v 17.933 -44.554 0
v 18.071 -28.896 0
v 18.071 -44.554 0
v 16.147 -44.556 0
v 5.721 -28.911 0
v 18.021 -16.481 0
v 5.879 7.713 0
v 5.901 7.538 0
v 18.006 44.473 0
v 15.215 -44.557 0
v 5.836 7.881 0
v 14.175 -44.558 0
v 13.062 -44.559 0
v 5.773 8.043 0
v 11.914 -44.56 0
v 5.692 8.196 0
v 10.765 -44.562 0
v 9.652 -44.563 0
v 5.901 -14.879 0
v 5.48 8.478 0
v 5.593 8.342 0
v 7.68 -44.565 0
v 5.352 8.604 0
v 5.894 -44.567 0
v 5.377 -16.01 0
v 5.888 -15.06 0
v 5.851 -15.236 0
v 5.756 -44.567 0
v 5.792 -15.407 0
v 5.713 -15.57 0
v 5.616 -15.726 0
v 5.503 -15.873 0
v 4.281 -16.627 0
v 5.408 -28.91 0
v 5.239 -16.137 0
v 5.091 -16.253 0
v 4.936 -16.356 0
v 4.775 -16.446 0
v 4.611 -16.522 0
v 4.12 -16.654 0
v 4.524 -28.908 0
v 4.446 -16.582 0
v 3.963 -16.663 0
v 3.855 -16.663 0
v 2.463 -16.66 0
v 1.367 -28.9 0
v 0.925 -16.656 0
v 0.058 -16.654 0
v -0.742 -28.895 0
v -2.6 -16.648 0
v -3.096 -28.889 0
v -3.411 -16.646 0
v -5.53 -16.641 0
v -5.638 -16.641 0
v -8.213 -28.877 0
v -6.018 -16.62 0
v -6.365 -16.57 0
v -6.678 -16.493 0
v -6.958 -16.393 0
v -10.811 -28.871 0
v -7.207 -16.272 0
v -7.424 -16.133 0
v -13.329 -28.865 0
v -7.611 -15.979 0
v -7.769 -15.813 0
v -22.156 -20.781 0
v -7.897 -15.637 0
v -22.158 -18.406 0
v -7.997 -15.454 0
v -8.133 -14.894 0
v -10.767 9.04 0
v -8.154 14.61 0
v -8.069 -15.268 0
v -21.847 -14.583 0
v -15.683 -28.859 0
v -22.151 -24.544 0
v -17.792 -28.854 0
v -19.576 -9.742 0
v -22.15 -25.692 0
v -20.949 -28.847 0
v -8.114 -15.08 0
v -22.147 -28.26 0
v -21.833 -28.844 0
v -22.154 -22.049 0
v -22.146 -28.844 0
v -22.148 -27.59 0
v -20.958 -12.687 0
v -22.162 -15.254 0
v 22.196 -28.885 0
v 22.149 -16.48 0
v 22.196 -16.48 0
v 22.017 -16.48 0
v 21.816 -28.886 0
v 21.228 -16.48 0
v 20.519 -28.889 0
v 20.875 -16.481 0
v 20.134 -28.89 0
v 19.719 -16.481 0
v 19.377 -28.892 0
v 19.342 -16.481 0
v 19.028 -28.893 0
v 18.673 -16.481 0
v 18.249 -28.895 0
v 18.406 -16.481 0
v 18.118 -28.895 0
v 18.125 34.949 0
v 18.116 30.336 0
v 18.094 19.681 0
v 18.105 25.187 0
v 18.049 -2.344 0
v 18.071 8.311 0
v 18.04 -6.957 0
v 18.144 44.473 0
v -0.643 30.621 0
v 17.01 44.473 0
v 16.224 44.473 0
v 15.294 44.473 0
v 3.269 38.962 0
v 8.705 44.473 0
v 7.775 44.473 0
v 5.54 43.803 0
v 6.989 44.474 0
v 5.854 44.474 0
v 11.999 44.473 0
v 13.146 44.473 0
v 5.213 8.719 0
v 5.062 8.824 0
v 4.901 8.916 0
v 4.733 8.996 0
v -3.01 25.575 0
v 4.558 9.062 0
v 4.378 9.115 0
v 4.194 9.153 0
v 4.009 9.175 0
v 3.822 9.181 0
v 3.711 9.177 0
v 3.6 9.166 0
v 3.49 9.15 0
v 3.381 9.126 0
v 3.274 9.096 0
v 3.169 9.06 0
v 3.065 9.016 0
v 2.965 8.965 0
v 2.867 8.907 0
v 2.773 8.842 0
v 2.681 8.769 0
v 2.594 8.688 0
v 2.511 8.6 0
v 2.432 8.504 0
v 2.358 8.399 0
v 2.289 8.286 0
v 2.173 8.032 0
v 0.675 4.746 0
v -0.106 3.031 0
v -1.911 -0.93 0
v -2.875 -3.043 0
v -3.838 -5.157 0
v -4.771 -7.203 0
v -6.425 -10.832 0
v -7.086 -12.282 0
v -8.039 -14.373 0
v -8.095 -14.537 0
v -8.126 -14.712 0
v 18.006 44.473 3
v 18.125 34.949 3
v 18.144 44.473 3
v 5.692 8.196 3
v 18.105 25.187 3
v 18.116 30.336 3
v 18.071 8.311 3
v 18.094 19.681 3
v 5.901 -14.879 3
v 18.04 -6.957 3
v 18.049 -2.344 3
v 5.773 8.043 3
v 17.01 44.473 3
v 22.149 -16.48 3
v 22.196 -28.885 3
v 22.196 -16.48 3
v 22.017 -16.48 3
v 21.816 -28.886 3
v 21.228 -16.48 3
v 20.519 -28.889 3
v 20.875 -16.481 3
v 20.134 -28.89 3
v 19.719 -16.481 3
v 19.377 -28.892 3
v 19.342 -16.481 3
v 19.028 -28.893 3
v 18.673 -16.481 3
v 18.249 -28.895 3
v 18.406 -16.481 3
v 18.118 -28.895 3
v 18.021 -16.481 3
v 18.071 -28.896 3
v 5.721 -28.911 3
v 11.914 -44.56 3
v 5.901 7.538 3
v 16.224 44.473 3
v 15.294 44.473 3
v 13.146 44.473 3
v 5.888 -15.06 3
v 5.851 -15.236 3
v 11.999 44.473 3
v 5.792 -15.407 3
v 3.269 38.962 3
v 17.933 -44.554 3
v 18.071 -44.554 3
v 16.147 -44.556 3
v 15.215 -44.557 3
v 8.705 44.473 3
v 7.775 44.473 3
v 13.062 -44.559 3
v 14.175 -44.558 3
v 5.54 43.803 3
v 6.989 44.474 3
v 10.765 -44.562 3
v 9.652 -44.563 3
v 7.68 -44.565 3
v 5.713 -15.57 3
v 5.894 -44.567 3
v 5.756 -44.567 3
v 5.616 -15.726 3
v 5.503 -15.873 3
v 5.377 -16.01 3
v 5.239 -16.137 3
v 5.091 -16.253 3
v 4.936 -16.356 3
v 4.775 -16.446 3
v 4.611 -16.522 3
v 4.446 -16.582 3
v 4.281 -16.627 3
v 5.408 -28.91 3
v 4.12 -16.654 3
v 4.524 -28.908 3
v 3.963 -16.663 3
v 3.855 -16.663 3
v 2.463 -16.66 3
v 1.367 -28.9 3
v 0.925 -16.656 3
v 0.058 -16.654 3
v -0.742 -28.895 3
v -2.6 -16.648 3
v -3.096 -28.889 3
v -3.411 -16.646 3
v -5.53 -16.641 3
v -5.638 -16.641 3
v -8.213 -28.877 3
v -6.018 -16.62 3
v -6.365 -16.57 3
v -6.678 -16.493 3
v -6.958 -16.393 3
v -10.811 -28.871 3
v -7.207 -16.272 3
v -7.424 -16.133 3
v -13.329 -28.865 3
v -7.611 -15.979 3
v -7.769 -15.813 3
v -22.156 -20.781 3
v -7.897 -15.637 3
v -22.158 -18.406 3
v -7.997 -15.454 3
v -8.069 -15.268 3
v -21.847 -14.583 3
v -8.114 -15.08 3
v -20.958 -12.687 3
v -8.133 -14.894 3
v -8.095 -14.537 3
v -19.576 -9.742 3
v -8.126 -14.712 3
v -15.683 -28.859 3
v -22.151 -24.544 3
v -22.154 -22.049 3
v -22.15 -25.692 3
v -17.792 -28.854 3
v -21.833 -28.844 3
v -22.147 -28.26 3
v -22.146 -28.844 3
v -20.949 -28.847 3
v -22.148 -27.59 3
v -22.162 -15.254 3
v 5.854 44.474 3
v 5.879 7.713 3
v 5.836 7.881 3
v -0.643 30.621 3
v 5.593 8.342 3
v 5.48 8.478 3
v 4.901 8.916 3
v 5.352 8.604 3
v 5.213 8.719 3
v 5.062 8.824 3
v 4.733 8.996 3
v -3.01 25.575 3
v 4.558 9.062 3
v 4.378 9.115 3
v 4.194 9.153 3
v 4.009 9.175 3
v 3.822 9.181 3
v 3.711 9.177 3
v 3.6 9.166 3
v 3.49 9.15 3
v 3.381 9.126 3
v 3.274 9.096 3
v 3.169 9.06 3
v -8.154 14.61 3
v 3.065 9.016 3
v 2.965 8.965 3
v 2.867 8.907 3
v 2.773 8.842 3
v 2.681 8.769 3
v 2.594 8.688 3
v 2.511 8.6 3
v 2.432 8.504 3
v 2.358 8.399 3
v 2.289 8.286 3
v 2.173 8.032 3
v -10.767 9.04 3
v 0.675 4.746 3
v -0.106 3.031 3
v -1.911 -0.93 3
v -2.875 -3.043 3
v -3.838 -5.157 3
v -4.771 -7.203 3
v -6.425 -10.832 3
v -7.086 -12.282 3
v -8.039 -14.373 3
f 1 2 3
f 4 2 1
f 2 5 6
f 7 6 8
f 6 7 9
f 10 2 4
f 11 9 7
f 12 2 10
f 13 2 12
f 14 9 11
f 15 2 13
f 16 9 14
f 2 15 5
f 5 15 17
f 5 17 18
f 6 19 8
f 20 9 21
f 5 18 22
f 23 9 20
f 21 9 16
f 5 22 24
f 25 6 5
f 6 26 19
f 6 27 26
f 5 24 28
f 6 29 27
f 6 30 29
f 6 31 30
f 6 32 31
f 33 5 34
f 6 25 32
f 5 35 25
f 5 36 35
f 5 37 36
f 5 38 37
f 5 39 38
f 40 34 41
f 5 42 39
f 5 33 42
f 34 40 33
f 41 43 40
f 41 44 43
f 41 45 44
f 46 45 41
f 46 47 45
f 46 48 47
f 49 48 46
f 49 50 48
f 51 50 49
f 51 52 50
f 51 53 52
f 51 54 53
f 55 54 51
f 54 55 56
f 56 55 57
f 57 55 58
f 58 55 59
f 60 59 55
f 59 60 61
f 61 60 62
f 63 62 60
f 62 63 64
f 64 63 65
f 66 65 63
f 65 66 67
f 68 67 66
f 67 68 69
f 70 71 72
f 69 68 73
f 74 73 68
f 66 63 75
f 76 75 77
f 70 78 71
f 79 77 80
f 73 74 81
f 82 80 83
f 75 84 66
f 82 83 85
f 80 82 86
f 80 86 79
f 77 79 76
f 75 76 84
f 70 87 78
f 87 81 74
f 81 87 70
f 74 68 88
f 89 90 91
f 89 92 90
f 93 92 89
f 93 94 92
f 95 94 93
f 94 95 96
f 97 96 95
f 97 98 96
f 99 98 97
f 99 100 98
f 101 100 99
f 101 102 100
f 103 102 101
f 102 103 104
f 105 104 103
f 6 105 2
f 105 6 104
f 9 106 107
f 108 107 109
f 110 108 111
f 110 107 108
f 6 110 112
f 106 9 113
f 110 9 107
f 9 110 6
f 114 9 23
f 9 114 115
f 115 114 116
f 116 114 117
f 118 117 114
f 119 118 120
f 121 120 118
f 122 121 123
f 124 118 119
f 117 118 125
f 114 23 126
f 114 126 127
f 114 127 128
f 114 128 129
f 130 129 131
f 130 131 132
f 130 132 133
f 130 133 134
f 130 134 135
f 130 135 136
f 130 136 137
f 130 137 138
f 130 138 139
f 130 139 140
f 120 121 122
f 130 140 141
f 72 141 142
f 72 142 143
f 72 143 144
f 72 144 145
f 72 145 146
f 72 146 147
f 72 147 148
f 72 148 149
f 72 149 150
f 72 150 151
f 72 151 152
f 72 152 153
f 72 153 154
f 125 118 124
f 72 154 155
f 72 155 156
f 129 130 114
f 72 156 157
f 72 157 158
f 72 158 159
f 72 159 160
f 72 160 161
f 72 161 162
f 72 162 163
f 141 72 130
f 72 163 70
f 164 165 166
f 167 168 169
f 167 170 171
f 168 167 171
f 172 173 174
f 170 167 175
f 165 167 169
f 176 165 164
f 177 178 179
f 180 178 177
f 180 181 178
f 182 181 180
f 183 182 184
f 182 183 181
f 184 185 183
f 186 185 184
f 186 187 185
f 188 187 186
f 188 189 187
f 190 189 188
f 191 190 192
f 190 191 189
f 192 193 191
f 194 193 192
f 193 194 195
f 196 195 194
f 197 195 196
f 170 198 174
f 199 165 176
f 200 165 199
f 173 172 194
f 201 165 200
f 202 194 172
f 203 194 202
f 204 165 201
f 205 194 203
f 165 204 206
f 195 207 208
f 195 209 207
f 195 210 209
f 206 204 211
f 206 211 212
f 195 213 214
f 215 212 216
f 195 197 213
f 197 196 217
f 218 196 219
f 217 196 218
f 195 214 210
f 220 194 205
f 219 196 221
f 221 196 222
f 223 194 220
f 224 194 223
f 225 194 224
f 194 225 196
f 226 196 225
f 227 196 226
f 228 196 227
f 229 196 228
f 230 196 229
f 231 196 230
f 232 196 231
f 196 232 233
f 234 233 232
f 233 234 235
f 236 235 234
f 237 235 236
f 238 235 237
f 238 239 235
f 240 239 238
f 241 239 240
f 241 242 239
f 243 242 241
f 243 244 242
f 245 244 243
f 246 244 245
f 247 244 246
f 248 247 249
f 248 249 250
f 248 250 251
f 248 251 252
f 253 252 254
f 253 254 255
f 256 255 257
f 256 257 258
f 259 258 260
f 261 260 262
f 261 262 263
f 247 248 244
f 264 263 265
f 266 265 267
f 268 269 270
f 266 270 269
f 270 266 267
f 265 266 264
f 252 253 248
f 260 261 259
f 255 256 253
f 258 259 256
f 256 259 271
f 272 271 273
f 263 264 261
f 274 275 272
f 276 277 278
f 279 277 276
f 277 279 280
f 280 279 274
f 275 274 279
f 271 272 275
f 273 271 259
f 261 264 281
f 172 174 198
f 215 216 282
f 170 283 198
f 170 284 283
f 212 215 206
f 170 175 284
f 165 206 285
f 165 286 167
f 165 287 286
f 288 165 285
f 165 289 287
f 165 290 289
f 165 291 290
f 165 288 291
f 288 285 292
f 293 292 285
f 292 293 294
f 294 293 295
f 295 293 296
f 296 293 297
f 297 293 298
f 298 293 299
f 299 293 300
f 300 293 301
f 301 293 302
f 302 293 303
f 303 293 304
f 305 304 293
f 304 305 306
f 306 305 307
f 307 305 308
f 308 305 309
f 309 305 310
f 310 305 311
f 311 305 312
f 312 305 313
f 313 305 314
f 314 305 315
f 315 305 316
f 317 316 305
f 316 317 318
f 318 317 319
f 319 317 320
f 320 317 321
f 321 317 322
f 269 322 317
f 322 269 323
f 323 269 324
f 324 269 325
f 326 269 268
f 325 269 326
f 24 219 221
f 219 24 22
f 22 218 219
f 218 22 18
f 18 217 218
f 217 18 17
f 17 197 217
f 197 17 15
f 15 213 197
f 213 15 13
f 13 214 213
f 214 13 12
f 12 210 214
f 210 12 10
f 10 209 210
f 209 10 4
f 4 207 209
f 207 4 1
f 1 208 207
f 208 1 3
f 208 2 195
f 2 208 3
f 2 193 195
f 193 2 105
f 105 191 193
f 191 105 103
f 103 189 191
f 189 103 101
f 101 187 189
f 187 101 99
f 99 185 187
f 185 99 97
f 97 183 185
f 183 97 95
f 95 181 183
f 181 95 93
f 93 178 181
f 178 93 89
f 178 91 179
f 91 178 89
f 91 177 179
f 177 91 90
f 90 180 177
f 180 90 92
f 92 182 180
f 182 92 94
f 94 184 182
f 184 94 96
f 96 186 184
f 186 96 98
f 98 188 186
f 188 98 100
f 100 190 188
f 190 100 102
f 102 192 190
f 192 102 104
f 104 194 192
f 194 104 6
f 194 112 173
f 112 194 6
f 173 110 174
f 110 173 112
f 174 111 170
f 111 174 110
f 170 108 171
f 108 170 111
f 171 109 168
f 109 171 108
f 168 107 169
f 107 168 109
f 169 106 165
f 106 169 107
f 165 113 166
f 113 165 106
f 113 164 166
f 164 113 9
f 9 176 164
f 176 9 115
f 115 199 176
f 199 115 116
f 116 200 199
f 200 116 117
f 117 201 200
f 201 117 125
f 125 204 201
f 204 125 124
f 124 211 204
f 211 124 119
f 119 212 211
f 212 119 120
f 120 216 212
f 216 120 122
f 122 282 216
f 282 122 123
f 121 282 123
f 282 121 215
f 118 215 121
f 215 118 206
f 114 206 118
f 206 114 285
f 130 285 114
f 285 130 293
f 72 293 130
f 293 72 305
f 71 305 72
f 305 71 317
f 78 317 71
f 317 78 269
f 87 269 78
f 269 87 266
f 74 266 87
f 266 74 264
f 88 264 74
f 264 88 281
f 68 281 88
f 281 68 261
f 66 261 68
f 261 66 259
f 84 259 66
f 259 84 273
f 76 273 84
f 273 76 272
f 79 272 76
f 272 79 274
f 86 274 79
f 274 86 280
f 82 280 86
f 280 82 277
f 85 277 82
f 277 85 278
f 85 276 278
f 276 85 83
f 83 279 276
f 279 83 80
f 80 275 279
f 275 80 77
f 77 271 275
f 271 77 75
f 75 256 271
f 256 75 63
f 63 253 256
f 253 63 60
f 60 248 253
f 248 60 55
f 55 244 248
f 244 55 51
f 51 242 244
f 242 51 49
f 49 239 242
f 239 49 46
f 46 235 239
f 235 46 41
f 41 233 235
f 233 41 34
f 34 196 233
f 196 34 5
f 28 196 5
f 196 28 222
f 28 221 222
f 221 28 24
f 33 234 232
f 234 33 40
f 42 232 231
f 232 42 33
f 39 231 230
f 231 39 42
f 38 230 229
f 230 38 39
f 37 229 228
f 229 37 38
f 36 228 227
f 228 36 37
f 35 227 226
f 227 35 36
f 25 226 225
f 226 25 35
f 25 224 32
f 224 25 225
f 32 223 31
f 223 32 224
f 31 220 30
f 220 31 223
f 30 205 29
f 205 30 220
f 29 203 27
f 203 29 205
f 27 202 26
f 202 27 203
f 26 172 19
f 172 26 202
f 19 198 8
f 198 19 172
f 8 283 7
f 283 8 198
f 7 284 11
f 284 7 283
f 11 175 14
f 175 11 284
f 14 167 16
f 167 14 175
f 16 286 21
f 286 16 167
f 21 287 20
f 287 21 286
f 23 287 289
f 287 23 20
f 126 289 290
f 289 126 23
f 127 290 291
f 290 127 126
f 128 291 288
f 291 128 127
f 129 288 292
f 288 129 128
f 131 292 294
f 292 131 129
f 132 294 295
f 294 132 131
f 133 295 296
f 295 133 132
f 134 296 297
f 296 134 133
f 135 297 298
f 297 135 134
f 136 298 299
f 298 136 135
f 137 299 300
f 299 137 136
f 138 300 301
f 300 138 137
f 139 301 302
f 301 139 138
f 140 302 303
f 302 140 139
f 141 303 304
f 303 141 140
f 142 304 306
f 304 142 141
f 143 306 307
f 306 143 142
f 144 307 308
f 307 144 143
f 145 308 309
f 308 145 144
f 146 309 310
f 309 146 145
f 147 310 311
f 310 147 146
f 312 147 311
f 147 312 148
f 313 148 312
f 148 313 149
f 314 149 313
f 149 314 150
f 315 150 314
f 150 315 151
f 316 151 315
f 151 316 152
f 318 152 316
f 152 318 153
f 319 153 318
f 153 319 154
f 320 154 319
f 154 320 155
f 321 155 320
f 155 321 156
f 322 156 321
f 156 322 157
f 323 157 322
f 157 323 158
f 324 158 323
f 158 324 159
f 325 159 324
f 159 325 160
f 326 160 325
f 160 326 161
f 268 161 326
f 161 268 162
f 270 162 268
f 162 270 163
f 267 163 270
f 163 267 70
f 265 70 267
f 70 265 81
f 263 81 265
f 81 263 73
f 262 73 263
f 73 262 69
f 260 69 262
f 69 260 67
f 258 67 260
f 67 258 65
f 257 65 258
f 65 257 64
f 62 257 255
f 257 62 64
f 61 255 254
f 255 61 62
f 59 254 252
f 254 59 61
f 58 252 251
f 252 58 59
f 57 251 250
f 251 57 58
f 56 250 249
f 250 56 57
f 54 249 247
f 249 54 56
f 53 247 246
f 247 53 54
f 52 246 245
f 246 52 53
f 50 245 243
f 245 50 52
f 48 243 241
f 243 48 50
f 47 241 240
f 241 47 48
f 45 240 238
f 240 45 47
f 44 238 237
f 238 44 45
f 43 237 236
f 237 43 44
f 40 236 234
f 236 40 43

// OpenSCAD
// Generated from 交通部公路局（原交通部公路總局）「新式號牌使用之英文字、數字字體」author trace
fudge = 0.1;

module glyph_2012_4(h = 3) {
  difference() {
    linear_extrude(height = h)
      polygon(points = [[5.8545, 44.4736], [5.5398, 43.8029], [4.6506, 41.9072], [3.269, 38.9617], [1.4769, 35.1412], [-0.6435, 30.6209], [-3.0101, 25.5755], [-5.5409, 20.1802], [-8.1538, 14.6099], [-10.7667, 9.0397], [-13.2975, 3.6444], [-15.6641, -1.401], [-17.7845, -5.9214], [-19.5765, -9.7418], [-20.9582, -12.6873], [-21.8474, -14.583], [-22.1621, -15.2538], [-22.1619, -15.4064], [-22.1614, -15.8377], [-22.1606, -16.5079], [-22.1596, -17.3772], [-22.1584, -18.4057], [-22.1571, -19.5537], [-22.1557, -20.7813], [-22.1542, -22.0488], [-22.1528, -23.3162], [-22.1514, -24.5438], [-22.15, -25.6918], [-22.1488, -26.7203], [-22.1478, -27.5896], [-22.1471, -28.2598], [-22.1466, -28.6911], [-22.1464, -28.8438], [-21.8334, -28.8445], [-20.949, -28.8466], [-19.5746, -28.8499], [-17.7921, -28.8542], [-15.6829, -28.8592], [-13.3289, -28.8649], [-10.8115, -28.8709], [-8.2126, -28.8772], [-5.6136, -28.8834], [-3.0962, -28.8894], [-0.7422, -28.8951], [1.367, -28.9001], [3.1495, -28.9044], [4.5238, -28.9077], [5.4083, -28.9098], [5.7213, -28.9106], [5.7217, -29.0864], [5.7228, -29.5833], [5.7245, -30.3554], [5.7267, -31.3568], [5.7293, -32.5417], [5.7322, -33.8643], [5.7353, -35.2785], [5.7385, -36.7386], [5.7417, -38.1988], [5.7448, -39.613], [5.7477, -40.9355], [5.7503, -42.1205], [5.7525, -43.1219], [5.7542, -43.894], [5.7553, -44.3909], [5.7557, -44.5667], [5.894, -44.5666], [6.2849, -44.5662], [6.8922, -44.5656], [7.68, -44.5648], [8.6121, -44.5638], [9.6525, -44.5627], [10.765, -44.5616], [11.9136, -44.5604], [13.0621, -44.5593], [14.1746, -44.5581], [15.215, -44.5571], [16.1471, -44.5561], [16.9349, -44.5553], [17.5422, -44.5547], [17.9331, -44.5543], [18.0714, -44.5541], [18.0714, -44.3783], [18.0714, -43.8813], [18.0714, -43.1091], [18.0714, -42.1075], [18.0714, -40.9224], [18.0714, -39.5997], [18.0714, -38.1852], [18.0714, -36.7249], [18.0714, -35.2645], [18.0714, -33.85], [18.0714, -32.5273], [18.0714, -31.3422], [18.0714, -30.3406], [18.0714, -29.5684], [18.0714, -29.0714], [18.0714, -28.8956], [18.1177, -28.8955], [18.2487, -28.8951], [18.4521, -28.8946], [18.7159, -28.8939], [19.0281, -28.8931], [19.3766, -28.8923], [19.7492, -28.8913], [20.1339, -28.8903], [20.5186, -28.8894], [20.8912, -28.8884], [21.2396, -28.8875], [21.5518, -28.8867], [21.8156, -28.886], [22.0191, -28.8855], [22.15, -28.8852], [22.1963, -28.8851], [22.1963, -28.7458], [22.1963, -28.3521], [22.1963, -27.7403], [22.1963, -26.9469], [22.1963, -26.008], [22.1963, -24.9602], [22.1963, -23.8396], [22.1963, -22.6828], [22.1963, -21.5259], [22.1963, -20.4053], [22.1963, -19.3575], [22.1963, -18.4187], [22.1963, -17.6252], [22.1963, -17.0135], [22.1963, -16.6197], [22.1963, -16.4804], [22.1494, -16.4804], [22.0169, -16.4805], [21.811, -16.4805], [21.5439, -16.4805], [21.2278, -16.4805], [20.8751, -16.4806], [20.4979, -16.4806], [20.1085, -16.4806], [19.7191, -16.4806], [19.3419, -16.4807], [18.9891, -16.4807], [18.6731, -16.4807], [18.406, -16.4808], [18.2001, -16.4808], [18.0676, -16.4808], [18.0207, -16.4808], [18.0221, -15.7963], [18.026, -13.8617], [18.0321, -10.8557], [18.04, -6.9568], [18.0493, -2.3436], [18.0598, 2.8053], [18.071, 8.3114], [18.0825, 13.996], [18.094, 19.6807], [18.1052, 25.1867], [18.1156, 30.3357], [18.125, 34.9488], [18.1329, 38.8477], [18.139, 41.8537], [18.1429, 43.7883], [18.1443, 44.4728], [18.0063, 44.4729], [17.6162, 44.4729], [17.0101, 44.4729], [16.224, 44.473], [15.2939, 44.473], [14.2557, 44.4731], [13.1456, 44.4732], [11.9994, 44.4732], [10.8532, 44.4733], [9.7431, 44.4734], [8.7049, 44.4735], [7.7748, 44.4735], [6.9886, 44.4736], [6.3826, 44.4736], [5.9925, 44.4736]]);
    translate([0, 0, -fudge])
      linear_extrude(height = h + 2 * fudge)
        polygon(points = [[3.8223, 9.1812], [4.0087, 9.1749], [4.1945, 9.1526], [4.3781, 9.1149], [4.5581, 9.0625], [4.733, 8.996], [4.9014, 8.9162], [5.0618, 8.8238], [5.2126, 8.7195], [5.3525, 8.6039], [5.48, 8.4777], [5.5935, 8.3417], [5.6916, 8.1965], [5.7729, 8.0428], [5.8358, 7.8813], [5.879, 7.7127], [5.9008, 7.5377], [5.9008, 7.2859], [5.9008, 6.5745], [5.9008, 5.4689], [5.9008, 4.035], [5.9008, 2.3384], [5.9008, 0.4448], [5.9008, -1.5802], [5.9008, -3.6709], [5.9008, -5.7615], [5.9008, -7.7865], [5.9008, -9.6801], [5.9008, -11.3767], [5.9008, -12.8107], [5.9008, -13.9162], [5.9008, -14.6277], [5.9008, -14.8794], [5.888, -15.0603], [5.8511, -15.2364], [5.7921, -15.4066], [5.7131, -15.57], [5.6162, -15.7257], [5.5035, -15.8728], [5.377, -16.0104], [5.2389, -16.1374], [5.0912, -16.253], [4.9359, -16.3562], [4.7752, -16.4461], [4.6112, -16.5218], [4.4458, -16.5823], [4.2813, -16.6266], [4.1197, -16.6539], [3.963, -16.6632], [3.8552, -16.663], [3.5505, -16.6623], [3.077, -16.6612], [2.4628, -16.6598], [1.7361, -16.6581], [0.9251, -16.6562], [0.0578, -16.6543], [-0.8377, -16.6522], [-1.7331, -16.6501], [-2.6004, -16.6481], [-3.4115, -16.6463], [-4.1381, -16.6446], [-4.7523, -16.6432], [-5.2258, -16.6421], [-5.5305, -16.6414], [-5.6383, -16.6411], [-6.0184, -16.6201], [-6.3646, -16.5699], [-6.6776, -16.4933], [-6.9581, -16.3932], [-7.2068, -16.2723], [-7.4244, -16.1335], [-7.6115, -15.9794], [-7.7689, -15.8131], [-7.8971, -15.6372], [-7.997, -15.4545], [-8.0692, -15.2678], [-8.1144, -15.08], [-8.1333, -14.8938], [-8.1265, -14.712], [-8.0947, -14.5375], [-8.0387, -14.373], [-7.9227, -14.1185], [-7.5949, -13.3993], [-7.0856, -12.2818], [-6.4249, -10.8324], [-5.6433, -9.1175], [-4.7709, -7.2034], [-3.8379, -5.1566], [-2.8747, -3.0433], [-1.9115, -0.9301], [-0.9786, 1.1168], [-0.1062, 3.0309], [0.6755, 4.7458], [1.3361, 6.1952], [1.8454, 7.3127], [2.1732, 8.0319], [2.2892, 8.2863], [2.3582, 8.3991], [2.4322, 8.5036], [2.511, 8.6], [2.5942, 8.6884], [2.6815, 8.769], [2.7726, 8.8419], [2.8672, 8.9073], [2.9649, 8.9652], [3.0655, 9.016], [3.1686, 9.0596], [3.2739, 9.0964], [3.3811, 9.1263], [3.4899, 9.1496], [3.5999, 9.1664], [3.7108, 9.1769], [3.8223, 9.1811], [3.8223, 9.1811], [3.8223, 9.1811], [3.8223, 9.1811], [3.8223, 9.1811], [3.8223, 9.1811], [3.8223, 9.1811], [3.8223, 9.1811], [3.8223, 9.1812], [3.8223, 9.1812], [3.8223, 9.1812], [3.8223, 9.1812], [3.8223, 9.1812], [3.8223, 9.1812], [3.8223, 9.1812], [3.8223, 9.1812]]);
  }
}

glyph_2012_4();
